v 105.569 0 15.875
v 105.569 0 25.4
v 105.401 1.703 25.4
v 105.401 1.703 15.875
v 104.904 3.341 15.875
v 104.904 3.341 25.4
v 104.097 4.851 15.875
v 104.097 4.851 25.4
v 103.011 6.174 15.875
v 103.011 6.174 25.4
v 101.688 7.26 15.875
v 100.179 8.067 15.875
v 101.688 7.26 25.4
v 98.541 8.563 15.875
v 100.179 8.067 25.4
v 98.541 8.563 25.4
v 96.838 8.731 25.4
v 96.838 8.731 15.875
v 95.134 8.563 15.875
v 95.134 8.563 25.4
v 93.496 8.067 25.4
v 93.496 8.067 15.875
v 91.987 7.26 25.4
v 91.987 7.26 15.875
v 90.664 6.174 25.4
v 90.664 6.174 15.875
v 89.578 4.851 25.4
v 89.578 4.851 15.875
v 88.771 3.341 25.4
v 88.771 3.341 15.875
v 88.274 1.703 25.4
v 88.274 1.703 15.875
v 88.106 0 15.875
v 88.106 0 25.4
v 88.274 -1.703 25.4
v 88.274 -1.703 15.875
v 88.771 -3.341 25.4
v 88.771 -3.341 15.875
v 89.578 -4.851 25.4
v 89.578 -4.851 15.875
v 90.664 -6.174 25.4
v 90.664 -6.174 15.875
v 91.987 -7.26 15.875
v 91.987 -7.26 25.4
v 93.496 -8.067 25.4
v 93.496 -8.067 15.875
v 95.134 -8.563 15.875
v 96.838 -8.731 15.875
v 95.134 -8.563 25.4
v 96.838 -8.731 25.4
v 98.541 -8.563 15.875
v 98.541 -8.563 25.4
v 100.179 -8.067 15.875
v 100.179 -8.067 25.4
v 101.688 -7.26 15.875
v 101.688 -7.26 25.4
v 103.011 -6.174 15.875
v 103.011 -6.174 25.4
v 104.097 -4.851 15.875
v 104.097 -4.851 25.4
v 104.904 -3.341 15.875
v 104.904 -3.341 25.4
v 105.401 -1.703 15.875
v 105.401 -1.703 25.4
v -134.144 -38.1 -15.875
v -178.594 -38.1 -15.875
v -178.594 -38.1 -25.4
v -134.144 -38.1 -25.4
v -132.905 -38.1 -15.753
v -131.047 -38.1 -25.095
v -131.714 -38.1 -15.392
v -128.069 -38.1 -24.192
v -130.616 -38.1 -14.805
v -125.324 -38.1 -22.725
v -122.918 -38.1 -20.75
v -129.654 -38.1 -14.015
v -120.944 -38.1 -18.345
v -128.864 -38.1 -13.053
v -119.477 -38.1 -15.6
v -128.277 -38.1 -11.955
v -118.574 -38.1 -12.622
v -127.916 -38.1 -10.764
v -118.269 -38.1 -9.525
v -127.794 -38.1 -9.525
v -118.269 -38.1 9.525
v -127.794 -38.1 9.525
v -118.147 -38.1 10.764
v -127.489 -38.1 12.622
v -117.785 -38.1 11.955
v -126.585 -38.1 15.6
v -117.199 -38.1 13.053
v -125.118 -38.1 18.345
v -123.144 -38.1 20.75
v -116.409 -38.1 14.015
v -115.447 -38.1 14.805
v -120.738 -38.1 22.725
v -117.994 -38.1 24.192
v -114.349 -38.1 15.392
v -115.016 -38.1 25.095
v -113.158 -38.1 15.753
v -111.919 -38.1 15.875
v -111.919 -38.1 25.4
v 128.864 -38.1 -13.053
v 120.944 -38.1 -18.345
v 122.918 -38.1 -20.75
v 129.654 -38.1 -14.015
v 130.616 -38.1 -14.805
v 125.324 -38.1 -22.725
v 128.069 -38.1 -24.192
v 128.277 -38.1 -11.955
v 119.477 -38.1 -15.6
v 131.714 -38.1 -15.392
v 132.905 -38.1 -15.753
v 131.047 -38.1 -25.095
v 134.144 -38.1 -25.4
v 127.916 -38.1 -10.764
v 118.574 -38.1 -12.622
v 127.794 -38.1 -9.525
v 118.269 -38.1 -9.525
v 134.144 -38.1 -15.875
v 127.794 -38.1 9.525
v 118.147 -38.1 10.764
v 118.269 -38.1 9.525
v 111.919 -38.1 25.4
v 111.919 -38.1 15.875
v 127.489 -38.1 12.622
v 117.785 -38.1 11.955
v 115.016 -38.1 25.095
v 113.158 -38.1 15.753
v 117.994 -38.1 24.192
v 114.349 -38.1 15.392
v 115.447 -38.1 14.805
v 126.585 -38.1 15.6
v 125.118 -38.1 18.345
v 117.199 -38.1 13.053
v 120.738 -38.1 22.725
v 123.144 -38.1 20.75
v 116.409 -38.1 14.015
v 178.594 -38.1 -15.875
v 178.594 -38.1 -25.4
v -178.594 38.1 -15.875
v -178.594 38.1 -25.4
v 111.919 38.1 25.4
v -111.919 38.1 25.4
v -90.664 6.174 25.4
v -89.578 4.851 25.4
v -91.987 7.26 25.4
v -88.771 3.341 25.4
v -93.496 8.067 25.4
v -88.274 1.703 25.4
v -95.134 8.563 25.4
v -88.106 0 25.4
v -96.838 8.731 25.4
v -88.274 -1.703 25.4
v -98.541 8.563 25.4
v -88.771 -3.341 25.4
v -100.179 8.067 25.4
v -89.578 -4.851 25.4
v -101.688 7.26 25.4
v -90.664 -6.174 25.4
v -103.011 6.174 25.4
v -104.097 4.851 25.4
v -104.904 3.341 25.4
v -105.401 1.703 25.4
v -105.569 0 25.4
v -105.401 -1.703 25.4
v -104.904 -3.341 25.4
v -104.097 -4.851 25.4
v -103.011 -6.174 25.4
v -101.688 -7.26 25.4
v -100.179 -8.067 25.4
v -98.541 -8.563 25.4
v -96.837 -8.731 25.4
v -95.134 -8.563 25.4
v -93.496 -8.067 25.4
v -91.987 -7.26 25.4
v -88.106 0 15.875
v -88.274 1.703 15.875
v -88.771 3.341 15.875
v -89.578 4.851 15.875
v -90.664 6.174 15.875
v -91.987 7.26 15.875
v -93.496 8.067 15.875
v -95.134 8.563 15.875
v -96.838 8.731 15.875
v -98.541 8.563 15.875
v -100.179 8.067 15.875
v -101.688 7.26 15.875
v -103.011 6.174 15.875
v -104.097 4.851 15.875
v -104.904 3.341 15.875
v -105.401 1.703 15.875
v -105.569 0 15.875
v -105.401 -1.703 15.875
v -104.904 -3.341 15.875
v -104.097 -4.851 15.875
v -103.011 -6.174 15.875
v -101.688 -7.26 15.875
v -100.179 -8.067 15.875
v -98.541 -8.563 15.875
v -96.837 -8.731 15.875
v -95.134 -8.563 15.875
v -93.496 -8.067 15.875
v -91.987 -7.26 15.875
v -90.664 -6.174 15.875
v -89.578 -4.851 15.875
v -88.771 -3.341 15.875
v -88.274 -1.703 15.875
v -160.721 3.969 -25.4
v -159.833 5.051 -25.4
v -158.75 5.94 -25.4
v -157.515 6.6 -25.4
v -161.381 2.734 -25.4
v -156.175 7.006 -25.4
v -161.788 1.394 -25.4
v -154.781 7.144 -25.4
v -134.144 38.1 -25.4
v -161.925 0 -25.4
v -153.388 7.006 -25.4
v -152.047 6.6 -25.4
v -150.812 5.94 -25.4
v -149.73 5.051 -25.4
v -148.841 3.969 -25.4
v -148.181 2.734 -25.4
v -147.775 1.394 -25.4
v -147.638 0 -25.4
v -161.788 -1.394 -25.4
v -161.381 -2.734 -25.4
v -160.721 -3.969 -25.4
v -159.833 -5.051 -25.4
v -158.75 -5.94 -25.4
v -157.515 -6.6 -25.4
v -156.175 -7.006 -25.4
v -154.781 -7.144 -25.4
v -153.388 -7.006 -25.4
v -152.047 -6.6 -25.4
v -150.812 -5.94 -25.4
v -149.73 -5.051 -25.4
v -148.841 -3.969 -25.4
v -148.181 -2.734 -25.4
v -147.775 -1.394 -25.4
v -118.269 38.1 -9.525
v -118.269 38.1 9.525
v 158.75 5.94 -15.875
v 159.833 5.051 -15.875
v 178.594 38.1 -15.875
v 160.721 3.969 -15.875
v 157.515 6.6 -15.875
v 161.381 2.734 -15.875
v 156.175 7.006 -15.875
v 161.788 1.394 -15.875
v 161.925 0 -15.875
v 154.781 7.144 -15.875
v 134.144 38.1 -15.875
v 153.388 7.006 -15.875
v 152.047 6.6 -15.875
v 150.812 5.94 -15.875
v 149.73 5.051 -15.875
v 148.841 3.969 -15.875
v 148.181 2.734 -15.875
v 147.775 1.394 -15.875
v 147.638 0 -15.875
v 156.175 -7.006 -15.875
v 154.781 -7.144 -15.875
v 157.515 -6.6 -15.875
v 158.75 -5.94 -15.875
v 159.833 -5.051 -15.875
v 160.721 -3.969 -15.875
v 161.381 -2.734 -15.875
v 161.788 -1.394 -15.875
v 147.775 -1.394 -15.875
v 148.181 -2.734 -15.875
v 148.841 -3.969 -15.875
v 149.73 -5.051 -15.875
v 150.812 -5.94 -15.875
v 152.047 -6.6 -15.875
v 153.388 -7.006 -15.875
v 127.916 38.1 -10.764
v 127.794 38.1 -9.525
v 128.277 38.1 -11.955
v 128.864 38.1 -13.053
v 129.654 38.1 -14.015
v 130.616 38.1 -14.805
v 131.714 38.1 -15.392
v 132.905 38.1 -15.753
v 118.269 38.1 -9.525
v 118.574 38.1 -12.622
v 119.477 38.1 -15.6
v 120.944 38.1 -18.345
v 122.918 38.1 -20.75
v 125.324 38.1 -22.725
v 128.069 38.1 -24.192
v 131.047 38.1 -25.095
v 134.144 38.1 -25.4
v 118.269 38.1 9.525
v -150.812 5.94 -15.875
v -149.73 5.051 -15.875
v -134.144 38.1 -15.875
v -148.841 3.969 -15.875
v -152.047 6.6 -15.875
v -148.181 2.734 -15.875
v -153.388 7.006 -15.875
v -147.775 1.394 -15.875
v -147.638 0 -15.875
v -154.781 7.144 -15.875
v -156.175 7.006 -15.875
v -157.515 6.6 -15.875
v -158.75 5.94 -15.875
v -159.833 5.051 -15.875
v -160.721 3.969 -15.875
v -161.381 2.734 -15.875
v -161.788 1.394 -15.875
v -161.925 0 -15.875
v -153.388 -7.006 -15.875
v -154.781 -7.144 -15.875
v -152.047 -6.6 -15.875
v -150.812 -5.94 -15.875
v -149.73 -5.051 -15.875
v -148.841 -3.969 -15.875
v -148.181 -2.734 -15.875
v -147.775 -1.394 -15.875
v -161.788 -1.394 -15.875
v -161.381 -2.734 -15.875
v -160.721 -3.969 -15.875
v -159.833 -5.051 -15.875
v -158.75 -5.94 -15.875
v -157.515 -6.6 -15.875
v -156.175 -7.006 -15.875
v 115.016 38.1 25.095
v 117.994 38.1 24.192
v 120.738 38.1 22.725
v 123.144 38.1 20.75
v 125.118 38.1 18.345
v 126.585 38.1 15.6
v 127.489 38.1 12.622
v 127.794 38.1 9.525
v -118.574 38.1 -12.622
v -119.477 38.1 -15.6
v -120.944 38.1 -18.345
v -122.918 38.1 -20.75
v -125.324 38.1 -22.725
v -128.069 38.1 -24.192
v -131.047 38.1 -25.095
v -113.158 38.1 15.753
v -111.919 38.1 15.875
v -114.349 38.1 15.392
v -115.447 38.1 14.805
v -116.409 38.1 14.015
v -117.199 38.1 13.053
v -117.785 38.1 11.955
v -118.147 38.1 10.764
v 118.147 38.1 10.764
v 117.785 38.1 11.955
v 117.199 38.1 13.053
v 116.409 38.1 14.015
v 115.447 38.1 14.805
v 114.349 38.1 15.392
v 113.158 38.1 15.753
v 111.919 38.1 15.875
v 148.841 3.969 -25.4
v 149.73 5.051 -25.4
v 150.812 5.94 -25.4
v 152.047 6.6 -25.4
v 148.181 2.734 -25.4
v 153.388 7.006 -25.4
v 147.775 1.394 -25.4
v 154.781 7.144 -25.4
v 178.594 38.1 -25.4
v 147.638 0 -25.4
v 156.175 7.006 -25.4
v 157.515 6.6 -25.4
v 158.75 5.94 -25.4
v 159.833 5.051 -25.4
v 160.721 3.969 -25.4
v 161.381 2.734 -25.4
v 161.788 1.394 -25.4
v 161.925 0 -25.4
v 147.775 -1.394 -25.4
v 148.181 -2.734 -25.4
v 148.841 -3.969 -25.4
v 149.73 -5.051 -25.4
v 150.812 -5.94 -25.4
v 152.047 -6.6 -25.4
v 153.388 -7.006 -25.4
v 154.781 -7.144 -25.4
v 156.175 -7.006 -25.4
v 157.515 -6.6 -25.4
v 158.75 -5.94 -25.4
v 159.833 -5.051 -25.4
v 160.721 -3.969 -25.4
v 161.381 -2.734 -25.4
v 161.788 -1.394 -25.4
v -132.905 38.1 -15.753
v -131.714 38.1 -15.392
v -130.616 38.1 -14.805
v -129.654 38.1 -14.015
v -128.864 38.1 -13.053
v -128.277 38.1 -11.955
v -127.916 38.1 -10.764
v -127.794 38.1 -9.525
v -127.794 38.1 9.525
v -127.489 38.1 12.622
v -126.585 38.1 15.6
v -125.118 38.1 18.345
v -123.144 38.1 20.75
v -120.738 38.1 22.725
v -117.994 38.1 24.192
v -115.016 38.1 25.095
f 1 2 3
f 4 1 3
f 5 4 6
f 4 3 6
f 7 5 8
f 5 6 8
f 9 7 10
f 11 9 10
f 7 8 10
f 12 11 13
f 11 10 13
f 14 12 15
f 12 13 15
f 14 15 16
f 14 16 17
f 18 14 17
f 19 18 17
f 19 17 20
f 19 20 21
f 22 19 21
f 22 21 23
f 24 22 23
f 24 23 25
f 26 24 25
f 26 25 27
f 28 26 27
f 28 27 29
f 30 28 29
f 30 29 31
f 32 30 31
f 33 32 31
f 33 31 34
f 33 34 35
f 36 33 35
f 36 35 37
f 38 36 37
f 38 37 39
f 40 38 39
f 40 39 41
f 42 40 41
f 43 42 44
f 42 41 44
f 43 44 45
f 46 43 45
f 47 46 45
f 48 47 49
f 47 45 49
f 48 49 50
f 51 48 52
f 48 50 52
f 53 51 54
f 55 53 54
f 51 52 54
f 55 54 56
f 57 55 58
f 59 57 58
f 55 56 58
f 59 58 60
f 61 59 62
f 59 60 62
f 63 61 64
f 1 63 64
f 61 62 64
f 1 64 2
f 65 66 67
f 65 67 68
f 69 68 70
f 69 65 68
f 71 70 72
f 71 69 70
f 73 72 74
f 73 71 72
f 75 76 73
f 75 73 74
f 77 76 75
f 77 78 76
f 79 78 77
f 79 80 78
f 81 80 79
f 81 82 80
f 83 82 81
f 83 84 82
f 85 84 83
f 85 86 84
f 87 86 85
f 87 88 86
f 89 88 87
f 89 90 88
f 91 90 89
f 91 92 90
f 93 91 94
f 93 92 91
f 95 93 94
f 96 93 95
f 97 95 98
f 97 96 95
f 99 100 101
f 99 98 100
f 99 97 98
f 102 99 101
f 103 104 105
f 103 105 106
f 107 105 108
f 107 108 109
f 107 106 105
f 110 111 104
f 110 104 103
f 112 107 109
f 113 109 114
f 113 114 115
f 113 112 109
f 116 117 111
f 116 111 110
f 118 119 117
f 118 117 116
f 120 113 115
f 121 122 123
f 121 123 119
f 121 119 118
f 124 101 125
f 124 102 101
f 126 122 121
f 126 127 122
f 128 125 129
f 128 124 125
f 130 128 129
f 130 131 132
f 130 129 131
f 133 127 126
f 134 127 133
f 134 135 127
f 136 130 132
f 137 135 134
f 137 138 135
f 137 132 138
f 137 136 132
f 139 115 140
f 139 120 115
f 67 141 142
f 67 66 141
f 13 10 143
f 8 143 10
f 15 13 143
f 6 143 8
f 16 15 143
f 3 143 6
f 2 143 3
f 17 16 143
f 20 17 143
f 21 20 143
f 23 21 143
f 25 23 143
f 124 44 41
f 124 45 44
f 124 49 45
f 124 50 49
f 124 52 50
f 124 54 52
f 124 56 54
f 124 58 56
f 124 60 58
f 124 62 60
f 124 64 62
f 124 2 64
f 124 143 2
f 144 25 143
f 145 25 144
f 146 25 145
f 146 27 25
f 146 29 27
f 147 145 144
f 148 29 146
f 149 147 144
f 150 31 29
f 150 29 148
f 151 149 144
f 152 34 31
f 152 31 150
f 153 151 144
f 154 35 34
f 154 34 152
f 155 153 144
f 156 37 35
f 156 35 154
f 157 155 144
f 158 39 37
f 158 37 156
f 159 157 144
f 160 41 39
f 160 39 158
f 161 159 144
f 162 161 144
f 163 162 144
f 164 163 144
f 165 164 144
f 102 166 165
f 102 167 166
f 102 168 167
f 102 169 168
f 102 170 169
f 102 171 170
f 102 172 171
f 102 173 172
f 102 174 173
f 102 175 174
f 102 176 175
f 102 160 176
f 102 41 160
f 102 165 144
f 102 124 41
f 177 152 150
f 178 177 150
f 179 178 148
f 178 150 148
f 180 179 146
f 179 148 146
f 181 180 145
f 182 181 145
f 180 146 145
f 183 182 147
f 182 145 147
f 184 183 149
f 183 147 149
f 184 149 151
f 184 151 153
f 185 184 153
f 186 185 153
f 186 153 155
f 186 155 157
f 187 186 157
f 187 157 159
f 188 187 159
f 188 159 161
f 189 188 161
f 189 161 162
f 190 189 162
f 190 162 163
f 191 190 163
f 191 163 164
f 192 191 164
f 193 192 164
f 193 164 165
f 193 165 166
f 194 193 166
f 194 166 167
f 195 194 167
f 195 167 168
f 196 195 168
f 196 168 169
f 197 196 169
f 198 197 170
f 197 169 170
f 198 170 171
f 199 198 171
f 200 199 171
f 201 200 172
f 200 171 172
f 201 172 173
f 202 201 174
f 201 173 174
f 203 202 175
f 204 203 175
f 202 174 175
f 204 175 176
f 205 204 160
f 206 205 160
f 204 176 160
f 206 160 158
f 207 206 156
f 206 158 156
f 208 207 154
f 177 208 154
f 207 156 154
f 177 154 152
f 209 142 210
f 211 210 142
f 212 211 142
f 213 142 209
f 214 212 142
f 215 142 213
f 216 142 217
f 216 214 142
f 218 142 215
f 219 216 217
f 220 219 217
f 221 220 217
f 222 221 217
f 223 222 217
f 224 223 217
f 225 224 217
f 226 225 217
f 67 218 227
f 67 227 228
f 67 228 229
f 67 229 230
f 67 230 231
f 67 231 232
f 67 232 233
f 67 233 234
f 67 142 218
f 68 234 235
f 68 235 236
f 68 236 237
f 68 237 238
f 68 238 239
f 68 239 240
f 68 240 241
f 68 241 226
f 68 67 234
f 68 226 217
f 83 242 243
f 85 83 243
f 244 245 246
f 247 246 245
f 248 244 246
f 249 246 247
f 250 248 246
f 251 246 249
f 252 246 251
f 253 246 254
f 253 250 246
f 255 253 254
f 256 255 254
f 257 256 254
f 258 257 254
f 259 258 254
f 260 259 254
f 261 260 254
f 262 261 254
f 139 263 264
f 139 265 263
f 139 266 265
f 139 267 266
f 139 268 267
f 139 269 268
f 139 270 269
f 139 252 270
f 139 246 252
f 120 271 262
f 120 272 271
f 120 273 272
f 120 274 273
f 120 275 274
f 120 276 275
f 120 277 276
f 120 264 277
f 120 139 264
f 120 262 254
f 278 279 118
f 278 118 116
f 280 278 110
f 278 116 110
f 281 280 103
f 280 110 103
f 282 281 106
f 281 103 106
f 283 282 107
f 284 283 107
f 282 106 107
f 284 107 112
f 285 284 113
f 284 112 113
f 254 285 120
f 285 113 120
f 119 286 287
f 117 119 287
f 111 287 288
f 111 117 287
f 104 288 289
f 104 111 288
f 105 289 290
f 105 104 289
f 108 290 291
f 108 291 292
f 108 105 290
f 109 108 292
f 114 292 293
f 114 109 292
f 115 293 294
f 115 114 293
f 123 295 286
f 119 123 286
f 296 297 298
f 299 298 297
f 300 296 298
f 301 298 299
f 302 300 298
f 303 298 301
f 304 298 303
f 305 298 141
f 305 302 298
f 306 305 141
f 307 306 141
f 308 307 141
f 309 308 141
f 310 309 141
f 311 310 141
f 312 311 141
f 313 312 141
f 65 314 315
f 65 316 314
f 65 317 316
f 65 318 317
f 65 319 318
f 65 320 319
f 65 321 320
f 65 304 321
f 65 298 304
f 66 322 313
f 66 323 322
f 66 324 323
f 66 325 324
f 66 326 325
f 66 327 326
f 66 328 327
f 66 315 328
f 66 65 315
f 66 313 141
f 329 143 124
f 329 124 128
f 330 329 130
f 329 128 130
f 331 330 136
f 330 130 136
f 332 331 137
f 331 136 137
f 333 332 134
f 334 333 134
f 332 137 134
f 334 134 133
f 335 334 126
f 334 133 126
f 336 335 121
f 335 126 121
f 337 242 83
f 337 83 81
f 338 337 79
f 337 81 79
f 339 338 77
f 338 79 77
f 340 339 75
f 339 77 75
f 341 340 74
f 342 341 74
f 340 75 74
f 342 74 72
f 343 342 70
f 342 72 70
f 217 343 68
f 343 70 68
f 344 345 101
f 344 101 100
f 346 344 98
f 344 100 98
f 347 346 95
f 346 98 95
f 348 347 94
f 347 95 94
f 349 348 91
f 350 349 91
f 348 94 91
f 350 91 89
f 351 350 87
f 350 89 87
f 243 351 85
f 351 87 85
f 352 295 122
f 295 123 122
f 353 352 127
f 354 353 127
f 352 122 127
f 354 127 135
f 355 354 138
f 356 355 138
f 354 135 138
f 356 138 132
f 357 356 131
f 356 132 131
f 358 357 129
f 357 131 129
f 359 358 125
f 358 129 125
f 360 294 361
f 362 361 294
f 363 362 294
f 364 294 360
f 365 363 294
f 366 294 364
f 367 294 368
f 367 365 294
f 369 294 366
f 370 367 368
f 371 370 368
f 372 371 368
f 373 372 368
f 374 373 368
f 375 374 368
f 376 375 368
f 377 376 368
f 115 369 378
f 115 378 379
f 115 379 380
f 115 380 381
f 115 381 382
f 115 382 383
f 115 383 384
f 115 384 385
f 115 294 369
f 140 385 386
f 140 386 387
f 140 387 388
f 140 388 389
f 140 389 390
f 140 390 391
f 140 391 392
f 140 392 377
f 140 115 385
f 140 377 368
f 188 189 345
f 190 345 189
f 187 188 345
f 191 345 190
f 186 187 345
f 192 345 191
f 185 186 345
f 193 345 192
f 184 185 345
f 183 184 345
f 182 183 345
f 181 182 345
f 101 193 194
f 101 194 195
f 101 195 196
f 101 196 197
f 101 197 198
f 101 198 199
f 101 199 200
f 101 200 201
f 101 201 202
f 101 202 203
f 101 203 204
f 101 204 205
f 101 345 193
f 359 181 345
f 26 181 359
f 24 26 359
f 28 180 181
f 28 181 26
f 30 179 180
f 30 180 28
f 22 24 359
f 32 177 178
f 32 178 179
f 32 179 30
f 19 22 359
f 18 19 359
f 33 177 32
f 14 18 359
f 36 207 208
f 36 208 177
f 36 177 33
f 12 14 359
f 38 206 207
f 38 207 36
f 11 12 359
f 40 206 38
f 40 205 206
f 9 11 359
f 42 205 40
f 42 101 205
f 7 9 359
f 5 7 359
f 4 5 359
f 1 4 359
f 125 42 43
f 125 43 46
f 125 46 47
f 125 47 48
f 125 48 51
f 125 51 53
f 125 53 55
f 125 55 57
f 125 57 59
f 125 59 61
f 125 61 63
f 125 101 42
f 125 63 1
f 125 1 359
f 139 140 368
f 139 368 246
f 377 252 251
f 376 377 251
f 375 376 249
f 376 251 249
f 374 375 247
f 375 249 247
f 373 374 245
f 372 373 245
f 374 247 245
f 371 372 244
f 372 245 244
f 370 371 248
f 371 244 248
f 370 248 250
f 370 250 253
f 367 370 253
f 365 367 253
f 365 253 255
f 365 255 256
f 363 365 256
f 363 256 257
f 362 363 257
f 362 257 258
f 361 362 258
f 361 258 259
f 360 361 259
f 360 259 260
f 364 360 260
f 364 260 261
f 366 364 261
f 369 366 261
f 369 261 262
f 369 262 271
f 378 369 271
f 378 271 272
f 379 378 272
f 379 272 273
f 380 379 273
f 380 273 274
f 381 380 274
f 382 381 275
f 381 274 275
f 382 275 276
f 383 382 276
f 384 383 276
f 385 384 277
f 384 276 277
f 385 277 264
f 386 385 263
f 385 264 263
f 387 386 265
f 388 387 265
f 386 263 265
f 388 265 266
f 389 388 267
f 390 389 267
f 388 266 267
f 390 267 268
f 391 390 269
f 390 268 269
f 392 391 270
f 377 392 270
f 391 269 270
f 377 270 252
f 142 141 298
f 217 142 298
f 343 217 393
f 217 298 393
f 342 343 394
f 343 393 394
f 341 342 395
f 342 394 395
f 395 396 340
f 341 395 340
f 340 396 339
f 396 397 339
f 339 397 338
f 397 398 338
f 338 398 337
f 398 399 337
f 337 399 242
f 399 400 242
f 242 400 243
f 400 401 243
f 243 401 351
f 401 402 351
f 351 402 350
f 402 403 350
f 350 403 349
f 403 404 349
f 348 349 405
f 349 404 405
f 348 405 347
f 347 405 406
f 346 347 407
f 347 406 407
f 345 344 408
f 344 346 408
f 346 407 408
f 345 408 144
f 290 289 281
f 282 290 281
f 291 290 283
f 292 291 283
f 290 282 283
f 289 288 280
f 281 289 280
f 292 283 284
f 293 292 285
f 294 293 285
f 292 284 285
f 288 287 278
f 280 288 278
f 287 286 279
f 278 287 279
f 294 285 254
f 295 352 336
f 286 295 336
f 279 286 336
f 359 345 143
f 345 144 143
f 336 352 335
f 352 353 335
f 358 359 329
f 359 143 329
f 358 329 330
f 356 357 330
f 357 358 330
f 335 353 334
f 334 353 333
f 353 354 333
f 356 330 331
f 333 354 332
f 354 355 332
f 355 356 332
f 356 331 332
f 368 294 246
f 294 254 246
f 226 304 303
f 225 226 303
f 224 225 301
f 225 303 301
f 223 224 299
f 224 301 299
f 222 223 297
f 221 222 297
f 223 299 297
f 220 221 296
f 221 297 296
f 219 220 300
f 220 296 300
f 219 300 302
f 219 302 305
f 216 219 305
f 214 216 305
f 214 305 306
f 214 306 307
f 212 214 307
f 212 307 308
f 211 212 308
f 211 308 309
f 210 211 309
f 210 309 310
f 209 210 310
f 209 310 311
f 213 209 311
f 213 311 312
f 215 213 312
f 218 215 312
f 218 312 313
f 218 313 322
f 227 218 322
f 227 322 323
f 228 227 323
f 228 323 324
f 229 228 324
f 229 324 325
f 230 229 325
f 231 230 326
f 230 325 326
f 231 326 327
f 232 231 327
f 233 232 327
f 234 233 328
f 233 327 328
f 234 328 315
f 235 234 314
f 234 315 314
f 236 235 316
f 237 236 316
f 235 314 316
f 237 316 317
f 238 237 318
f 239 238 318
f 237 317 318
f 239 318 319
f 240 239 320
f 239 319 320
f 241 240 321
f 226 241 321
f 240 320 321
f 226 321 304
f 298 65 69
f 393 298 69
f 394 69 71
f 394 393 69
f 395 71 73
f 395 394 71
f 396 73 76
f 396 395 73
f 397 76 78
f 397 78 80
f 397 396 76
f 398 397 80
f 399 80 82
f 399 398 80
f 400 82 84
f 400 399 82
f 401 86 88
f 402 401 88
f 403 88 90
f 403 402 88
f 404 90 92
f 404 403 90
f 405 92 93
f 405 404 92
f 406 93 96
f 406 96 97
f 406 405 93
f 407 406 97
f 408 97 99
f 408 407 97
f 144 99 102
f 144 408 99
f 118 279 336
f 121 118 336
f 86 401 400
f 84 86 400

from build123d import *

# Parameters (mm, degrees)
F1_DEPTH = 38.1
F2_R     = 6.35
F3_R     = 15.875
F4_R     = 8.73125
F5_DEPTH = 25.4
F6_R     = 7.14375
F7_DEPTH = 25.4


with BuildPart() as f1:
    # F0 (on Front) → F1 (new body, symmetric)
    with BuildSketch(Plane.XZ):
        Polygon((-178.59375, -15.875), (-178.59375, -25.4), (-118.26875, -25.4), (-118.26875, 15.875), (118.26875, 15.875), (118.26875, -25.4), (178.59375, -25.4), (178.59375, -15.875), (127.79375, -15.875), (127.79375, 25.4), (-127.79375, 25.4), (-127.79375, -15.875), align=None)
    extrude(amount=F1_DEPTH, both=True)

    # F2
    f2_edges = [f1.edges().sort_by_distance(p)[0] for p in [
        (-127.79375, 0, -15.875),
        (-118.26875, 0, 15.875),
        (118.26875, 0, 15.875),
        (127.79375, 0, -15.875),
    ]]
    fillet(f2_edges, radius=F2_R)

    # F3
    f3_edges = [f1.edges().sort_by_distance(p)[0] for p in [
        (-127.79375, 0, 25.4),
        (127.79375, 0, 25.4),
        (118.26875, 0, -25.4),
        (-118.26875, 0, -25.4),
    ]]
    fillet(f3_edges, radius=F3_R)

    # F4 (on face) → F5 (cut)
    with BuildSketch(Plane.XY.offset(25.4)):
        with Locations((-96.8375, 0)):
            Circle(F4_R)
        with Locations((96.8375, 0)):
            Circle(F4_R)
    extrude(amount=-F5_DEPTH, mode=Mode.SUBTRACT)

    # F6 (on face) → F7 (cut)
    with BuildSketch(Plane.XY.offset(-15.875)):
        with Locations((-154.78125, 0)):
            Circle(F6_R)
        with Locations((154.78125, 0)):
            Circle(F6_R)
    extrude(amount=-F7_DEPTH, mode=Mode.SUBTRACT)


solid = f1.part
